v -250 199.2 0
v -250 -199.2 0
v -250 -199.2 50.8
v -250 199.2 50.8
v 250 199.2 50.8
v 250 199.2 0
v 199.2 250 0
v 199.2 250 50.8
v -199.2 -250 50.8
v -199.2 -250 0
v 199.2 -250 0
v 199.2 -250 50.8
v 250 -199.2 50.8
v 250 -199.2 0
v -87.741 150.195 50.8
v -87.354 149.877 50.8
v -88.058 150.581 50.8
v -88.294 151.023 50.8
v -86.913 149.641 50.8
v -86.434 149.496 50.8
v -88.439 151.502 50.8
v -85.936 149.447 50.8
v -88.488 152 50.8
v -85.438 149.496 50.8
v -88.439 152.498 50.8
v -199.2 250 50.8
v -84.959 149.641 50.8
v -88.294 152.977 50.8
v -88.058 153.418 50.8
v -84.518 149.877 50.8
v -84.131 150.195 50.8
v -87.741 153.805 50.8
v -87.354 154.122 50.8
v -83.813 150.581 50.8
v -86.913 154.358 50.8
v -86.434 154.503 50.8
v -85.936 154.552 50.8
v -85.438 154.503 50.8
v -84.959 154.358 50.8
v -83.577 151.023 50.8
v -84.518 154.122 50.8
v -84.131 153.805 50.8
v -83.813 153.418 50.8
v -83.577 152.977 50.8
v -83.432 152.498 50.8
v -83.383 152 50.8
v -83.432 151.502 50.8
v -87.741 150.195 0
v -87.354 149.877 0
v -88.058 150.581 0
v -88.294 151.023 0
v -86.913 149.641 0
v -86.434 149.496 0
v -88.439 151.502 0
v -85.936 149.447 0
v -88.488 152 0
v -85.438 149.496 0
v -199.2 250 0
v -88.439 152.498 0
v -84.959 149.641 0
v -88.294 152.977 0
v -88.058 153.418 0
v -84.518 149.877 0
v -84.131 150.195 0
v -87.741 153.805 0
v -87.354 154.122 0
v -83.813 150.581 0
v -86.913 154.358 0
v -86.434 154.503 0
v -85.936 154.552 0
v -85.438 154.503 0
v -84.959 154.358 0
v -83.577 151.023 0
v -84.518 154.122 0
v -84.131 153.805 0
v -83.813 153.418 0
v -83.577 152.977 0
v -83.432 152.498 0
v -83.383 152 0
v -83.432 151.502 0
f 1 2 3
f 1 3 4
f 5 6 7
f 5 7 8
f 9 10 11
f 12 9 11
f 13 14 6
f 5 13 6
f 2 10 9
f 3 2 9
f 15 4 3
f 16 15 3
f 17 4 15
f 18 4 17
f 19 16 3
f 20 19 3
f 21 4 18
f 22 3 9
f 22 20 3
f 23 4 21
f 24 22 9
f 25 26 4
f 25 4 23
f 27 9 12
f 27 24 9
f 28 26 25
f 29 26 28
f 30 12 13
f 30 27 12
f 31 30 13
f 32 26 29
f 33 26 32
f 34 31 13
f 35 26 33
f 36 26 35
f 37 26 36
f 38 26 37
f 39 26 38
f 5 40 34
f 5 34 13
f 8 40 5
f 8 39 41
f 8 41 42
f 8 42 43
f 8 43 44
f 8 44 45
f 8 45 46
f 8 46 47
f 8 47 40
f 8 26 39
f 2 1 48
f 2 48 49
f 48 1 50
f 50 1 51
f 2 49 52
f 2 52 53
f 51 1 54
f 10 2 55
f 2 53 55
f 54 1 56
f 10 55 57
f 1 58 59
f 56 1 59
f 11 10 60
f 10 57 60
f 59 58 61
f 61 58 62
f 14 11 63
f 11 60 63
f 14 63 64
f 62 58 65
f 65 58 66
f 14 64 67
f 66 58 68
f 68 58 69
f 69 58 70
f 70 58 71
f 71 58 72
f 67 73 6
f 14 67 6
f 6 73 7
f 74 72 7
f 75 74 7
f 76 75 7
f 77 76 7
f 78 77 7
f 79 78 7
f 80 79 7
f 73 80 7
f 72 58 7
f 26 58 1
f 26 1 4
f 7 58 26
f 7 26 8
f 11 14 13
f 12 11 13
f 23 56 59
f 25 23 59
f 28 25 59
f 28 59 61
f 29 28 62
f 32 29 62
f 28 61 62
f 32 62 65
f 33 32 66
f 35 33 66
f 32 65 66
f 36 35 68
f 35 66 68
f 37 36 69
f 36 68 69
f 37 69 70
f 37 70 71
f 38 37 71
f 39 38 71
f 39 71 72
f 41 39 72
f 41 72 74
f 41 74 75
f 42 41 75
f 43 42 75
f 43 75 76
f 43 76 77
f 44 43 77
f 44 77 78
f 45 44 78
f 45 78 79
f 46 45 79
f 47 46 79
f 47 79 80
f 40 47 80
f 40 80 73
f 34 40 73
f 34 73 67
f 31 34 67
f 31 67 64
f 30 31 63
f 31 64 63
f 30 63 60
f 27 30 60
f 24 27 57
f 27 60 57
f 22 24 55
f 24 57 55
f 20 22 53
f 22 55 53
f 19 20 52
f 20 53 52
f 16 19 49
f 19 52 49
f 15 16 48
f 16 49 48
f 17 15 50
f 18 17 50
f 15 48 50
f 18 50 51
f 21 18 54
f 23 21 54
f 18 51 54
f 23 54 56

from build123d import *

# Parameters (mm, degrees)
F0_W     = 500
F0_H     = 500
F1_DEPTH = 50.8
F3_D     = 5.1054
F4_SIZE  = 50.8


with BuildPart() as f1:
    # F0 (on Top) → F1 (new body)
    with BuildSketch(Plane.XY):
        Rectangle(F0_W, F0_H)
    extrude(amount=F1_DEPTH)

    # F3 (through all)
    with Locations(Plane.XY.offset(50.8)):
        with Locations((-85.9357491136, 151.999682188)):
            Hole(F3_D / 2)

    # F4
    f4_edges = [f1.edges().sort_by_distance(p)[0] for p in [
        (-250, 250, 25.4),
        (-250, -250, 25.4),
        (250, -250, 25.4),
        (250, 250, 25.4),
    ]]
    chamfer(f4_edges, length=F4_SIZE)


solid = f1.part
